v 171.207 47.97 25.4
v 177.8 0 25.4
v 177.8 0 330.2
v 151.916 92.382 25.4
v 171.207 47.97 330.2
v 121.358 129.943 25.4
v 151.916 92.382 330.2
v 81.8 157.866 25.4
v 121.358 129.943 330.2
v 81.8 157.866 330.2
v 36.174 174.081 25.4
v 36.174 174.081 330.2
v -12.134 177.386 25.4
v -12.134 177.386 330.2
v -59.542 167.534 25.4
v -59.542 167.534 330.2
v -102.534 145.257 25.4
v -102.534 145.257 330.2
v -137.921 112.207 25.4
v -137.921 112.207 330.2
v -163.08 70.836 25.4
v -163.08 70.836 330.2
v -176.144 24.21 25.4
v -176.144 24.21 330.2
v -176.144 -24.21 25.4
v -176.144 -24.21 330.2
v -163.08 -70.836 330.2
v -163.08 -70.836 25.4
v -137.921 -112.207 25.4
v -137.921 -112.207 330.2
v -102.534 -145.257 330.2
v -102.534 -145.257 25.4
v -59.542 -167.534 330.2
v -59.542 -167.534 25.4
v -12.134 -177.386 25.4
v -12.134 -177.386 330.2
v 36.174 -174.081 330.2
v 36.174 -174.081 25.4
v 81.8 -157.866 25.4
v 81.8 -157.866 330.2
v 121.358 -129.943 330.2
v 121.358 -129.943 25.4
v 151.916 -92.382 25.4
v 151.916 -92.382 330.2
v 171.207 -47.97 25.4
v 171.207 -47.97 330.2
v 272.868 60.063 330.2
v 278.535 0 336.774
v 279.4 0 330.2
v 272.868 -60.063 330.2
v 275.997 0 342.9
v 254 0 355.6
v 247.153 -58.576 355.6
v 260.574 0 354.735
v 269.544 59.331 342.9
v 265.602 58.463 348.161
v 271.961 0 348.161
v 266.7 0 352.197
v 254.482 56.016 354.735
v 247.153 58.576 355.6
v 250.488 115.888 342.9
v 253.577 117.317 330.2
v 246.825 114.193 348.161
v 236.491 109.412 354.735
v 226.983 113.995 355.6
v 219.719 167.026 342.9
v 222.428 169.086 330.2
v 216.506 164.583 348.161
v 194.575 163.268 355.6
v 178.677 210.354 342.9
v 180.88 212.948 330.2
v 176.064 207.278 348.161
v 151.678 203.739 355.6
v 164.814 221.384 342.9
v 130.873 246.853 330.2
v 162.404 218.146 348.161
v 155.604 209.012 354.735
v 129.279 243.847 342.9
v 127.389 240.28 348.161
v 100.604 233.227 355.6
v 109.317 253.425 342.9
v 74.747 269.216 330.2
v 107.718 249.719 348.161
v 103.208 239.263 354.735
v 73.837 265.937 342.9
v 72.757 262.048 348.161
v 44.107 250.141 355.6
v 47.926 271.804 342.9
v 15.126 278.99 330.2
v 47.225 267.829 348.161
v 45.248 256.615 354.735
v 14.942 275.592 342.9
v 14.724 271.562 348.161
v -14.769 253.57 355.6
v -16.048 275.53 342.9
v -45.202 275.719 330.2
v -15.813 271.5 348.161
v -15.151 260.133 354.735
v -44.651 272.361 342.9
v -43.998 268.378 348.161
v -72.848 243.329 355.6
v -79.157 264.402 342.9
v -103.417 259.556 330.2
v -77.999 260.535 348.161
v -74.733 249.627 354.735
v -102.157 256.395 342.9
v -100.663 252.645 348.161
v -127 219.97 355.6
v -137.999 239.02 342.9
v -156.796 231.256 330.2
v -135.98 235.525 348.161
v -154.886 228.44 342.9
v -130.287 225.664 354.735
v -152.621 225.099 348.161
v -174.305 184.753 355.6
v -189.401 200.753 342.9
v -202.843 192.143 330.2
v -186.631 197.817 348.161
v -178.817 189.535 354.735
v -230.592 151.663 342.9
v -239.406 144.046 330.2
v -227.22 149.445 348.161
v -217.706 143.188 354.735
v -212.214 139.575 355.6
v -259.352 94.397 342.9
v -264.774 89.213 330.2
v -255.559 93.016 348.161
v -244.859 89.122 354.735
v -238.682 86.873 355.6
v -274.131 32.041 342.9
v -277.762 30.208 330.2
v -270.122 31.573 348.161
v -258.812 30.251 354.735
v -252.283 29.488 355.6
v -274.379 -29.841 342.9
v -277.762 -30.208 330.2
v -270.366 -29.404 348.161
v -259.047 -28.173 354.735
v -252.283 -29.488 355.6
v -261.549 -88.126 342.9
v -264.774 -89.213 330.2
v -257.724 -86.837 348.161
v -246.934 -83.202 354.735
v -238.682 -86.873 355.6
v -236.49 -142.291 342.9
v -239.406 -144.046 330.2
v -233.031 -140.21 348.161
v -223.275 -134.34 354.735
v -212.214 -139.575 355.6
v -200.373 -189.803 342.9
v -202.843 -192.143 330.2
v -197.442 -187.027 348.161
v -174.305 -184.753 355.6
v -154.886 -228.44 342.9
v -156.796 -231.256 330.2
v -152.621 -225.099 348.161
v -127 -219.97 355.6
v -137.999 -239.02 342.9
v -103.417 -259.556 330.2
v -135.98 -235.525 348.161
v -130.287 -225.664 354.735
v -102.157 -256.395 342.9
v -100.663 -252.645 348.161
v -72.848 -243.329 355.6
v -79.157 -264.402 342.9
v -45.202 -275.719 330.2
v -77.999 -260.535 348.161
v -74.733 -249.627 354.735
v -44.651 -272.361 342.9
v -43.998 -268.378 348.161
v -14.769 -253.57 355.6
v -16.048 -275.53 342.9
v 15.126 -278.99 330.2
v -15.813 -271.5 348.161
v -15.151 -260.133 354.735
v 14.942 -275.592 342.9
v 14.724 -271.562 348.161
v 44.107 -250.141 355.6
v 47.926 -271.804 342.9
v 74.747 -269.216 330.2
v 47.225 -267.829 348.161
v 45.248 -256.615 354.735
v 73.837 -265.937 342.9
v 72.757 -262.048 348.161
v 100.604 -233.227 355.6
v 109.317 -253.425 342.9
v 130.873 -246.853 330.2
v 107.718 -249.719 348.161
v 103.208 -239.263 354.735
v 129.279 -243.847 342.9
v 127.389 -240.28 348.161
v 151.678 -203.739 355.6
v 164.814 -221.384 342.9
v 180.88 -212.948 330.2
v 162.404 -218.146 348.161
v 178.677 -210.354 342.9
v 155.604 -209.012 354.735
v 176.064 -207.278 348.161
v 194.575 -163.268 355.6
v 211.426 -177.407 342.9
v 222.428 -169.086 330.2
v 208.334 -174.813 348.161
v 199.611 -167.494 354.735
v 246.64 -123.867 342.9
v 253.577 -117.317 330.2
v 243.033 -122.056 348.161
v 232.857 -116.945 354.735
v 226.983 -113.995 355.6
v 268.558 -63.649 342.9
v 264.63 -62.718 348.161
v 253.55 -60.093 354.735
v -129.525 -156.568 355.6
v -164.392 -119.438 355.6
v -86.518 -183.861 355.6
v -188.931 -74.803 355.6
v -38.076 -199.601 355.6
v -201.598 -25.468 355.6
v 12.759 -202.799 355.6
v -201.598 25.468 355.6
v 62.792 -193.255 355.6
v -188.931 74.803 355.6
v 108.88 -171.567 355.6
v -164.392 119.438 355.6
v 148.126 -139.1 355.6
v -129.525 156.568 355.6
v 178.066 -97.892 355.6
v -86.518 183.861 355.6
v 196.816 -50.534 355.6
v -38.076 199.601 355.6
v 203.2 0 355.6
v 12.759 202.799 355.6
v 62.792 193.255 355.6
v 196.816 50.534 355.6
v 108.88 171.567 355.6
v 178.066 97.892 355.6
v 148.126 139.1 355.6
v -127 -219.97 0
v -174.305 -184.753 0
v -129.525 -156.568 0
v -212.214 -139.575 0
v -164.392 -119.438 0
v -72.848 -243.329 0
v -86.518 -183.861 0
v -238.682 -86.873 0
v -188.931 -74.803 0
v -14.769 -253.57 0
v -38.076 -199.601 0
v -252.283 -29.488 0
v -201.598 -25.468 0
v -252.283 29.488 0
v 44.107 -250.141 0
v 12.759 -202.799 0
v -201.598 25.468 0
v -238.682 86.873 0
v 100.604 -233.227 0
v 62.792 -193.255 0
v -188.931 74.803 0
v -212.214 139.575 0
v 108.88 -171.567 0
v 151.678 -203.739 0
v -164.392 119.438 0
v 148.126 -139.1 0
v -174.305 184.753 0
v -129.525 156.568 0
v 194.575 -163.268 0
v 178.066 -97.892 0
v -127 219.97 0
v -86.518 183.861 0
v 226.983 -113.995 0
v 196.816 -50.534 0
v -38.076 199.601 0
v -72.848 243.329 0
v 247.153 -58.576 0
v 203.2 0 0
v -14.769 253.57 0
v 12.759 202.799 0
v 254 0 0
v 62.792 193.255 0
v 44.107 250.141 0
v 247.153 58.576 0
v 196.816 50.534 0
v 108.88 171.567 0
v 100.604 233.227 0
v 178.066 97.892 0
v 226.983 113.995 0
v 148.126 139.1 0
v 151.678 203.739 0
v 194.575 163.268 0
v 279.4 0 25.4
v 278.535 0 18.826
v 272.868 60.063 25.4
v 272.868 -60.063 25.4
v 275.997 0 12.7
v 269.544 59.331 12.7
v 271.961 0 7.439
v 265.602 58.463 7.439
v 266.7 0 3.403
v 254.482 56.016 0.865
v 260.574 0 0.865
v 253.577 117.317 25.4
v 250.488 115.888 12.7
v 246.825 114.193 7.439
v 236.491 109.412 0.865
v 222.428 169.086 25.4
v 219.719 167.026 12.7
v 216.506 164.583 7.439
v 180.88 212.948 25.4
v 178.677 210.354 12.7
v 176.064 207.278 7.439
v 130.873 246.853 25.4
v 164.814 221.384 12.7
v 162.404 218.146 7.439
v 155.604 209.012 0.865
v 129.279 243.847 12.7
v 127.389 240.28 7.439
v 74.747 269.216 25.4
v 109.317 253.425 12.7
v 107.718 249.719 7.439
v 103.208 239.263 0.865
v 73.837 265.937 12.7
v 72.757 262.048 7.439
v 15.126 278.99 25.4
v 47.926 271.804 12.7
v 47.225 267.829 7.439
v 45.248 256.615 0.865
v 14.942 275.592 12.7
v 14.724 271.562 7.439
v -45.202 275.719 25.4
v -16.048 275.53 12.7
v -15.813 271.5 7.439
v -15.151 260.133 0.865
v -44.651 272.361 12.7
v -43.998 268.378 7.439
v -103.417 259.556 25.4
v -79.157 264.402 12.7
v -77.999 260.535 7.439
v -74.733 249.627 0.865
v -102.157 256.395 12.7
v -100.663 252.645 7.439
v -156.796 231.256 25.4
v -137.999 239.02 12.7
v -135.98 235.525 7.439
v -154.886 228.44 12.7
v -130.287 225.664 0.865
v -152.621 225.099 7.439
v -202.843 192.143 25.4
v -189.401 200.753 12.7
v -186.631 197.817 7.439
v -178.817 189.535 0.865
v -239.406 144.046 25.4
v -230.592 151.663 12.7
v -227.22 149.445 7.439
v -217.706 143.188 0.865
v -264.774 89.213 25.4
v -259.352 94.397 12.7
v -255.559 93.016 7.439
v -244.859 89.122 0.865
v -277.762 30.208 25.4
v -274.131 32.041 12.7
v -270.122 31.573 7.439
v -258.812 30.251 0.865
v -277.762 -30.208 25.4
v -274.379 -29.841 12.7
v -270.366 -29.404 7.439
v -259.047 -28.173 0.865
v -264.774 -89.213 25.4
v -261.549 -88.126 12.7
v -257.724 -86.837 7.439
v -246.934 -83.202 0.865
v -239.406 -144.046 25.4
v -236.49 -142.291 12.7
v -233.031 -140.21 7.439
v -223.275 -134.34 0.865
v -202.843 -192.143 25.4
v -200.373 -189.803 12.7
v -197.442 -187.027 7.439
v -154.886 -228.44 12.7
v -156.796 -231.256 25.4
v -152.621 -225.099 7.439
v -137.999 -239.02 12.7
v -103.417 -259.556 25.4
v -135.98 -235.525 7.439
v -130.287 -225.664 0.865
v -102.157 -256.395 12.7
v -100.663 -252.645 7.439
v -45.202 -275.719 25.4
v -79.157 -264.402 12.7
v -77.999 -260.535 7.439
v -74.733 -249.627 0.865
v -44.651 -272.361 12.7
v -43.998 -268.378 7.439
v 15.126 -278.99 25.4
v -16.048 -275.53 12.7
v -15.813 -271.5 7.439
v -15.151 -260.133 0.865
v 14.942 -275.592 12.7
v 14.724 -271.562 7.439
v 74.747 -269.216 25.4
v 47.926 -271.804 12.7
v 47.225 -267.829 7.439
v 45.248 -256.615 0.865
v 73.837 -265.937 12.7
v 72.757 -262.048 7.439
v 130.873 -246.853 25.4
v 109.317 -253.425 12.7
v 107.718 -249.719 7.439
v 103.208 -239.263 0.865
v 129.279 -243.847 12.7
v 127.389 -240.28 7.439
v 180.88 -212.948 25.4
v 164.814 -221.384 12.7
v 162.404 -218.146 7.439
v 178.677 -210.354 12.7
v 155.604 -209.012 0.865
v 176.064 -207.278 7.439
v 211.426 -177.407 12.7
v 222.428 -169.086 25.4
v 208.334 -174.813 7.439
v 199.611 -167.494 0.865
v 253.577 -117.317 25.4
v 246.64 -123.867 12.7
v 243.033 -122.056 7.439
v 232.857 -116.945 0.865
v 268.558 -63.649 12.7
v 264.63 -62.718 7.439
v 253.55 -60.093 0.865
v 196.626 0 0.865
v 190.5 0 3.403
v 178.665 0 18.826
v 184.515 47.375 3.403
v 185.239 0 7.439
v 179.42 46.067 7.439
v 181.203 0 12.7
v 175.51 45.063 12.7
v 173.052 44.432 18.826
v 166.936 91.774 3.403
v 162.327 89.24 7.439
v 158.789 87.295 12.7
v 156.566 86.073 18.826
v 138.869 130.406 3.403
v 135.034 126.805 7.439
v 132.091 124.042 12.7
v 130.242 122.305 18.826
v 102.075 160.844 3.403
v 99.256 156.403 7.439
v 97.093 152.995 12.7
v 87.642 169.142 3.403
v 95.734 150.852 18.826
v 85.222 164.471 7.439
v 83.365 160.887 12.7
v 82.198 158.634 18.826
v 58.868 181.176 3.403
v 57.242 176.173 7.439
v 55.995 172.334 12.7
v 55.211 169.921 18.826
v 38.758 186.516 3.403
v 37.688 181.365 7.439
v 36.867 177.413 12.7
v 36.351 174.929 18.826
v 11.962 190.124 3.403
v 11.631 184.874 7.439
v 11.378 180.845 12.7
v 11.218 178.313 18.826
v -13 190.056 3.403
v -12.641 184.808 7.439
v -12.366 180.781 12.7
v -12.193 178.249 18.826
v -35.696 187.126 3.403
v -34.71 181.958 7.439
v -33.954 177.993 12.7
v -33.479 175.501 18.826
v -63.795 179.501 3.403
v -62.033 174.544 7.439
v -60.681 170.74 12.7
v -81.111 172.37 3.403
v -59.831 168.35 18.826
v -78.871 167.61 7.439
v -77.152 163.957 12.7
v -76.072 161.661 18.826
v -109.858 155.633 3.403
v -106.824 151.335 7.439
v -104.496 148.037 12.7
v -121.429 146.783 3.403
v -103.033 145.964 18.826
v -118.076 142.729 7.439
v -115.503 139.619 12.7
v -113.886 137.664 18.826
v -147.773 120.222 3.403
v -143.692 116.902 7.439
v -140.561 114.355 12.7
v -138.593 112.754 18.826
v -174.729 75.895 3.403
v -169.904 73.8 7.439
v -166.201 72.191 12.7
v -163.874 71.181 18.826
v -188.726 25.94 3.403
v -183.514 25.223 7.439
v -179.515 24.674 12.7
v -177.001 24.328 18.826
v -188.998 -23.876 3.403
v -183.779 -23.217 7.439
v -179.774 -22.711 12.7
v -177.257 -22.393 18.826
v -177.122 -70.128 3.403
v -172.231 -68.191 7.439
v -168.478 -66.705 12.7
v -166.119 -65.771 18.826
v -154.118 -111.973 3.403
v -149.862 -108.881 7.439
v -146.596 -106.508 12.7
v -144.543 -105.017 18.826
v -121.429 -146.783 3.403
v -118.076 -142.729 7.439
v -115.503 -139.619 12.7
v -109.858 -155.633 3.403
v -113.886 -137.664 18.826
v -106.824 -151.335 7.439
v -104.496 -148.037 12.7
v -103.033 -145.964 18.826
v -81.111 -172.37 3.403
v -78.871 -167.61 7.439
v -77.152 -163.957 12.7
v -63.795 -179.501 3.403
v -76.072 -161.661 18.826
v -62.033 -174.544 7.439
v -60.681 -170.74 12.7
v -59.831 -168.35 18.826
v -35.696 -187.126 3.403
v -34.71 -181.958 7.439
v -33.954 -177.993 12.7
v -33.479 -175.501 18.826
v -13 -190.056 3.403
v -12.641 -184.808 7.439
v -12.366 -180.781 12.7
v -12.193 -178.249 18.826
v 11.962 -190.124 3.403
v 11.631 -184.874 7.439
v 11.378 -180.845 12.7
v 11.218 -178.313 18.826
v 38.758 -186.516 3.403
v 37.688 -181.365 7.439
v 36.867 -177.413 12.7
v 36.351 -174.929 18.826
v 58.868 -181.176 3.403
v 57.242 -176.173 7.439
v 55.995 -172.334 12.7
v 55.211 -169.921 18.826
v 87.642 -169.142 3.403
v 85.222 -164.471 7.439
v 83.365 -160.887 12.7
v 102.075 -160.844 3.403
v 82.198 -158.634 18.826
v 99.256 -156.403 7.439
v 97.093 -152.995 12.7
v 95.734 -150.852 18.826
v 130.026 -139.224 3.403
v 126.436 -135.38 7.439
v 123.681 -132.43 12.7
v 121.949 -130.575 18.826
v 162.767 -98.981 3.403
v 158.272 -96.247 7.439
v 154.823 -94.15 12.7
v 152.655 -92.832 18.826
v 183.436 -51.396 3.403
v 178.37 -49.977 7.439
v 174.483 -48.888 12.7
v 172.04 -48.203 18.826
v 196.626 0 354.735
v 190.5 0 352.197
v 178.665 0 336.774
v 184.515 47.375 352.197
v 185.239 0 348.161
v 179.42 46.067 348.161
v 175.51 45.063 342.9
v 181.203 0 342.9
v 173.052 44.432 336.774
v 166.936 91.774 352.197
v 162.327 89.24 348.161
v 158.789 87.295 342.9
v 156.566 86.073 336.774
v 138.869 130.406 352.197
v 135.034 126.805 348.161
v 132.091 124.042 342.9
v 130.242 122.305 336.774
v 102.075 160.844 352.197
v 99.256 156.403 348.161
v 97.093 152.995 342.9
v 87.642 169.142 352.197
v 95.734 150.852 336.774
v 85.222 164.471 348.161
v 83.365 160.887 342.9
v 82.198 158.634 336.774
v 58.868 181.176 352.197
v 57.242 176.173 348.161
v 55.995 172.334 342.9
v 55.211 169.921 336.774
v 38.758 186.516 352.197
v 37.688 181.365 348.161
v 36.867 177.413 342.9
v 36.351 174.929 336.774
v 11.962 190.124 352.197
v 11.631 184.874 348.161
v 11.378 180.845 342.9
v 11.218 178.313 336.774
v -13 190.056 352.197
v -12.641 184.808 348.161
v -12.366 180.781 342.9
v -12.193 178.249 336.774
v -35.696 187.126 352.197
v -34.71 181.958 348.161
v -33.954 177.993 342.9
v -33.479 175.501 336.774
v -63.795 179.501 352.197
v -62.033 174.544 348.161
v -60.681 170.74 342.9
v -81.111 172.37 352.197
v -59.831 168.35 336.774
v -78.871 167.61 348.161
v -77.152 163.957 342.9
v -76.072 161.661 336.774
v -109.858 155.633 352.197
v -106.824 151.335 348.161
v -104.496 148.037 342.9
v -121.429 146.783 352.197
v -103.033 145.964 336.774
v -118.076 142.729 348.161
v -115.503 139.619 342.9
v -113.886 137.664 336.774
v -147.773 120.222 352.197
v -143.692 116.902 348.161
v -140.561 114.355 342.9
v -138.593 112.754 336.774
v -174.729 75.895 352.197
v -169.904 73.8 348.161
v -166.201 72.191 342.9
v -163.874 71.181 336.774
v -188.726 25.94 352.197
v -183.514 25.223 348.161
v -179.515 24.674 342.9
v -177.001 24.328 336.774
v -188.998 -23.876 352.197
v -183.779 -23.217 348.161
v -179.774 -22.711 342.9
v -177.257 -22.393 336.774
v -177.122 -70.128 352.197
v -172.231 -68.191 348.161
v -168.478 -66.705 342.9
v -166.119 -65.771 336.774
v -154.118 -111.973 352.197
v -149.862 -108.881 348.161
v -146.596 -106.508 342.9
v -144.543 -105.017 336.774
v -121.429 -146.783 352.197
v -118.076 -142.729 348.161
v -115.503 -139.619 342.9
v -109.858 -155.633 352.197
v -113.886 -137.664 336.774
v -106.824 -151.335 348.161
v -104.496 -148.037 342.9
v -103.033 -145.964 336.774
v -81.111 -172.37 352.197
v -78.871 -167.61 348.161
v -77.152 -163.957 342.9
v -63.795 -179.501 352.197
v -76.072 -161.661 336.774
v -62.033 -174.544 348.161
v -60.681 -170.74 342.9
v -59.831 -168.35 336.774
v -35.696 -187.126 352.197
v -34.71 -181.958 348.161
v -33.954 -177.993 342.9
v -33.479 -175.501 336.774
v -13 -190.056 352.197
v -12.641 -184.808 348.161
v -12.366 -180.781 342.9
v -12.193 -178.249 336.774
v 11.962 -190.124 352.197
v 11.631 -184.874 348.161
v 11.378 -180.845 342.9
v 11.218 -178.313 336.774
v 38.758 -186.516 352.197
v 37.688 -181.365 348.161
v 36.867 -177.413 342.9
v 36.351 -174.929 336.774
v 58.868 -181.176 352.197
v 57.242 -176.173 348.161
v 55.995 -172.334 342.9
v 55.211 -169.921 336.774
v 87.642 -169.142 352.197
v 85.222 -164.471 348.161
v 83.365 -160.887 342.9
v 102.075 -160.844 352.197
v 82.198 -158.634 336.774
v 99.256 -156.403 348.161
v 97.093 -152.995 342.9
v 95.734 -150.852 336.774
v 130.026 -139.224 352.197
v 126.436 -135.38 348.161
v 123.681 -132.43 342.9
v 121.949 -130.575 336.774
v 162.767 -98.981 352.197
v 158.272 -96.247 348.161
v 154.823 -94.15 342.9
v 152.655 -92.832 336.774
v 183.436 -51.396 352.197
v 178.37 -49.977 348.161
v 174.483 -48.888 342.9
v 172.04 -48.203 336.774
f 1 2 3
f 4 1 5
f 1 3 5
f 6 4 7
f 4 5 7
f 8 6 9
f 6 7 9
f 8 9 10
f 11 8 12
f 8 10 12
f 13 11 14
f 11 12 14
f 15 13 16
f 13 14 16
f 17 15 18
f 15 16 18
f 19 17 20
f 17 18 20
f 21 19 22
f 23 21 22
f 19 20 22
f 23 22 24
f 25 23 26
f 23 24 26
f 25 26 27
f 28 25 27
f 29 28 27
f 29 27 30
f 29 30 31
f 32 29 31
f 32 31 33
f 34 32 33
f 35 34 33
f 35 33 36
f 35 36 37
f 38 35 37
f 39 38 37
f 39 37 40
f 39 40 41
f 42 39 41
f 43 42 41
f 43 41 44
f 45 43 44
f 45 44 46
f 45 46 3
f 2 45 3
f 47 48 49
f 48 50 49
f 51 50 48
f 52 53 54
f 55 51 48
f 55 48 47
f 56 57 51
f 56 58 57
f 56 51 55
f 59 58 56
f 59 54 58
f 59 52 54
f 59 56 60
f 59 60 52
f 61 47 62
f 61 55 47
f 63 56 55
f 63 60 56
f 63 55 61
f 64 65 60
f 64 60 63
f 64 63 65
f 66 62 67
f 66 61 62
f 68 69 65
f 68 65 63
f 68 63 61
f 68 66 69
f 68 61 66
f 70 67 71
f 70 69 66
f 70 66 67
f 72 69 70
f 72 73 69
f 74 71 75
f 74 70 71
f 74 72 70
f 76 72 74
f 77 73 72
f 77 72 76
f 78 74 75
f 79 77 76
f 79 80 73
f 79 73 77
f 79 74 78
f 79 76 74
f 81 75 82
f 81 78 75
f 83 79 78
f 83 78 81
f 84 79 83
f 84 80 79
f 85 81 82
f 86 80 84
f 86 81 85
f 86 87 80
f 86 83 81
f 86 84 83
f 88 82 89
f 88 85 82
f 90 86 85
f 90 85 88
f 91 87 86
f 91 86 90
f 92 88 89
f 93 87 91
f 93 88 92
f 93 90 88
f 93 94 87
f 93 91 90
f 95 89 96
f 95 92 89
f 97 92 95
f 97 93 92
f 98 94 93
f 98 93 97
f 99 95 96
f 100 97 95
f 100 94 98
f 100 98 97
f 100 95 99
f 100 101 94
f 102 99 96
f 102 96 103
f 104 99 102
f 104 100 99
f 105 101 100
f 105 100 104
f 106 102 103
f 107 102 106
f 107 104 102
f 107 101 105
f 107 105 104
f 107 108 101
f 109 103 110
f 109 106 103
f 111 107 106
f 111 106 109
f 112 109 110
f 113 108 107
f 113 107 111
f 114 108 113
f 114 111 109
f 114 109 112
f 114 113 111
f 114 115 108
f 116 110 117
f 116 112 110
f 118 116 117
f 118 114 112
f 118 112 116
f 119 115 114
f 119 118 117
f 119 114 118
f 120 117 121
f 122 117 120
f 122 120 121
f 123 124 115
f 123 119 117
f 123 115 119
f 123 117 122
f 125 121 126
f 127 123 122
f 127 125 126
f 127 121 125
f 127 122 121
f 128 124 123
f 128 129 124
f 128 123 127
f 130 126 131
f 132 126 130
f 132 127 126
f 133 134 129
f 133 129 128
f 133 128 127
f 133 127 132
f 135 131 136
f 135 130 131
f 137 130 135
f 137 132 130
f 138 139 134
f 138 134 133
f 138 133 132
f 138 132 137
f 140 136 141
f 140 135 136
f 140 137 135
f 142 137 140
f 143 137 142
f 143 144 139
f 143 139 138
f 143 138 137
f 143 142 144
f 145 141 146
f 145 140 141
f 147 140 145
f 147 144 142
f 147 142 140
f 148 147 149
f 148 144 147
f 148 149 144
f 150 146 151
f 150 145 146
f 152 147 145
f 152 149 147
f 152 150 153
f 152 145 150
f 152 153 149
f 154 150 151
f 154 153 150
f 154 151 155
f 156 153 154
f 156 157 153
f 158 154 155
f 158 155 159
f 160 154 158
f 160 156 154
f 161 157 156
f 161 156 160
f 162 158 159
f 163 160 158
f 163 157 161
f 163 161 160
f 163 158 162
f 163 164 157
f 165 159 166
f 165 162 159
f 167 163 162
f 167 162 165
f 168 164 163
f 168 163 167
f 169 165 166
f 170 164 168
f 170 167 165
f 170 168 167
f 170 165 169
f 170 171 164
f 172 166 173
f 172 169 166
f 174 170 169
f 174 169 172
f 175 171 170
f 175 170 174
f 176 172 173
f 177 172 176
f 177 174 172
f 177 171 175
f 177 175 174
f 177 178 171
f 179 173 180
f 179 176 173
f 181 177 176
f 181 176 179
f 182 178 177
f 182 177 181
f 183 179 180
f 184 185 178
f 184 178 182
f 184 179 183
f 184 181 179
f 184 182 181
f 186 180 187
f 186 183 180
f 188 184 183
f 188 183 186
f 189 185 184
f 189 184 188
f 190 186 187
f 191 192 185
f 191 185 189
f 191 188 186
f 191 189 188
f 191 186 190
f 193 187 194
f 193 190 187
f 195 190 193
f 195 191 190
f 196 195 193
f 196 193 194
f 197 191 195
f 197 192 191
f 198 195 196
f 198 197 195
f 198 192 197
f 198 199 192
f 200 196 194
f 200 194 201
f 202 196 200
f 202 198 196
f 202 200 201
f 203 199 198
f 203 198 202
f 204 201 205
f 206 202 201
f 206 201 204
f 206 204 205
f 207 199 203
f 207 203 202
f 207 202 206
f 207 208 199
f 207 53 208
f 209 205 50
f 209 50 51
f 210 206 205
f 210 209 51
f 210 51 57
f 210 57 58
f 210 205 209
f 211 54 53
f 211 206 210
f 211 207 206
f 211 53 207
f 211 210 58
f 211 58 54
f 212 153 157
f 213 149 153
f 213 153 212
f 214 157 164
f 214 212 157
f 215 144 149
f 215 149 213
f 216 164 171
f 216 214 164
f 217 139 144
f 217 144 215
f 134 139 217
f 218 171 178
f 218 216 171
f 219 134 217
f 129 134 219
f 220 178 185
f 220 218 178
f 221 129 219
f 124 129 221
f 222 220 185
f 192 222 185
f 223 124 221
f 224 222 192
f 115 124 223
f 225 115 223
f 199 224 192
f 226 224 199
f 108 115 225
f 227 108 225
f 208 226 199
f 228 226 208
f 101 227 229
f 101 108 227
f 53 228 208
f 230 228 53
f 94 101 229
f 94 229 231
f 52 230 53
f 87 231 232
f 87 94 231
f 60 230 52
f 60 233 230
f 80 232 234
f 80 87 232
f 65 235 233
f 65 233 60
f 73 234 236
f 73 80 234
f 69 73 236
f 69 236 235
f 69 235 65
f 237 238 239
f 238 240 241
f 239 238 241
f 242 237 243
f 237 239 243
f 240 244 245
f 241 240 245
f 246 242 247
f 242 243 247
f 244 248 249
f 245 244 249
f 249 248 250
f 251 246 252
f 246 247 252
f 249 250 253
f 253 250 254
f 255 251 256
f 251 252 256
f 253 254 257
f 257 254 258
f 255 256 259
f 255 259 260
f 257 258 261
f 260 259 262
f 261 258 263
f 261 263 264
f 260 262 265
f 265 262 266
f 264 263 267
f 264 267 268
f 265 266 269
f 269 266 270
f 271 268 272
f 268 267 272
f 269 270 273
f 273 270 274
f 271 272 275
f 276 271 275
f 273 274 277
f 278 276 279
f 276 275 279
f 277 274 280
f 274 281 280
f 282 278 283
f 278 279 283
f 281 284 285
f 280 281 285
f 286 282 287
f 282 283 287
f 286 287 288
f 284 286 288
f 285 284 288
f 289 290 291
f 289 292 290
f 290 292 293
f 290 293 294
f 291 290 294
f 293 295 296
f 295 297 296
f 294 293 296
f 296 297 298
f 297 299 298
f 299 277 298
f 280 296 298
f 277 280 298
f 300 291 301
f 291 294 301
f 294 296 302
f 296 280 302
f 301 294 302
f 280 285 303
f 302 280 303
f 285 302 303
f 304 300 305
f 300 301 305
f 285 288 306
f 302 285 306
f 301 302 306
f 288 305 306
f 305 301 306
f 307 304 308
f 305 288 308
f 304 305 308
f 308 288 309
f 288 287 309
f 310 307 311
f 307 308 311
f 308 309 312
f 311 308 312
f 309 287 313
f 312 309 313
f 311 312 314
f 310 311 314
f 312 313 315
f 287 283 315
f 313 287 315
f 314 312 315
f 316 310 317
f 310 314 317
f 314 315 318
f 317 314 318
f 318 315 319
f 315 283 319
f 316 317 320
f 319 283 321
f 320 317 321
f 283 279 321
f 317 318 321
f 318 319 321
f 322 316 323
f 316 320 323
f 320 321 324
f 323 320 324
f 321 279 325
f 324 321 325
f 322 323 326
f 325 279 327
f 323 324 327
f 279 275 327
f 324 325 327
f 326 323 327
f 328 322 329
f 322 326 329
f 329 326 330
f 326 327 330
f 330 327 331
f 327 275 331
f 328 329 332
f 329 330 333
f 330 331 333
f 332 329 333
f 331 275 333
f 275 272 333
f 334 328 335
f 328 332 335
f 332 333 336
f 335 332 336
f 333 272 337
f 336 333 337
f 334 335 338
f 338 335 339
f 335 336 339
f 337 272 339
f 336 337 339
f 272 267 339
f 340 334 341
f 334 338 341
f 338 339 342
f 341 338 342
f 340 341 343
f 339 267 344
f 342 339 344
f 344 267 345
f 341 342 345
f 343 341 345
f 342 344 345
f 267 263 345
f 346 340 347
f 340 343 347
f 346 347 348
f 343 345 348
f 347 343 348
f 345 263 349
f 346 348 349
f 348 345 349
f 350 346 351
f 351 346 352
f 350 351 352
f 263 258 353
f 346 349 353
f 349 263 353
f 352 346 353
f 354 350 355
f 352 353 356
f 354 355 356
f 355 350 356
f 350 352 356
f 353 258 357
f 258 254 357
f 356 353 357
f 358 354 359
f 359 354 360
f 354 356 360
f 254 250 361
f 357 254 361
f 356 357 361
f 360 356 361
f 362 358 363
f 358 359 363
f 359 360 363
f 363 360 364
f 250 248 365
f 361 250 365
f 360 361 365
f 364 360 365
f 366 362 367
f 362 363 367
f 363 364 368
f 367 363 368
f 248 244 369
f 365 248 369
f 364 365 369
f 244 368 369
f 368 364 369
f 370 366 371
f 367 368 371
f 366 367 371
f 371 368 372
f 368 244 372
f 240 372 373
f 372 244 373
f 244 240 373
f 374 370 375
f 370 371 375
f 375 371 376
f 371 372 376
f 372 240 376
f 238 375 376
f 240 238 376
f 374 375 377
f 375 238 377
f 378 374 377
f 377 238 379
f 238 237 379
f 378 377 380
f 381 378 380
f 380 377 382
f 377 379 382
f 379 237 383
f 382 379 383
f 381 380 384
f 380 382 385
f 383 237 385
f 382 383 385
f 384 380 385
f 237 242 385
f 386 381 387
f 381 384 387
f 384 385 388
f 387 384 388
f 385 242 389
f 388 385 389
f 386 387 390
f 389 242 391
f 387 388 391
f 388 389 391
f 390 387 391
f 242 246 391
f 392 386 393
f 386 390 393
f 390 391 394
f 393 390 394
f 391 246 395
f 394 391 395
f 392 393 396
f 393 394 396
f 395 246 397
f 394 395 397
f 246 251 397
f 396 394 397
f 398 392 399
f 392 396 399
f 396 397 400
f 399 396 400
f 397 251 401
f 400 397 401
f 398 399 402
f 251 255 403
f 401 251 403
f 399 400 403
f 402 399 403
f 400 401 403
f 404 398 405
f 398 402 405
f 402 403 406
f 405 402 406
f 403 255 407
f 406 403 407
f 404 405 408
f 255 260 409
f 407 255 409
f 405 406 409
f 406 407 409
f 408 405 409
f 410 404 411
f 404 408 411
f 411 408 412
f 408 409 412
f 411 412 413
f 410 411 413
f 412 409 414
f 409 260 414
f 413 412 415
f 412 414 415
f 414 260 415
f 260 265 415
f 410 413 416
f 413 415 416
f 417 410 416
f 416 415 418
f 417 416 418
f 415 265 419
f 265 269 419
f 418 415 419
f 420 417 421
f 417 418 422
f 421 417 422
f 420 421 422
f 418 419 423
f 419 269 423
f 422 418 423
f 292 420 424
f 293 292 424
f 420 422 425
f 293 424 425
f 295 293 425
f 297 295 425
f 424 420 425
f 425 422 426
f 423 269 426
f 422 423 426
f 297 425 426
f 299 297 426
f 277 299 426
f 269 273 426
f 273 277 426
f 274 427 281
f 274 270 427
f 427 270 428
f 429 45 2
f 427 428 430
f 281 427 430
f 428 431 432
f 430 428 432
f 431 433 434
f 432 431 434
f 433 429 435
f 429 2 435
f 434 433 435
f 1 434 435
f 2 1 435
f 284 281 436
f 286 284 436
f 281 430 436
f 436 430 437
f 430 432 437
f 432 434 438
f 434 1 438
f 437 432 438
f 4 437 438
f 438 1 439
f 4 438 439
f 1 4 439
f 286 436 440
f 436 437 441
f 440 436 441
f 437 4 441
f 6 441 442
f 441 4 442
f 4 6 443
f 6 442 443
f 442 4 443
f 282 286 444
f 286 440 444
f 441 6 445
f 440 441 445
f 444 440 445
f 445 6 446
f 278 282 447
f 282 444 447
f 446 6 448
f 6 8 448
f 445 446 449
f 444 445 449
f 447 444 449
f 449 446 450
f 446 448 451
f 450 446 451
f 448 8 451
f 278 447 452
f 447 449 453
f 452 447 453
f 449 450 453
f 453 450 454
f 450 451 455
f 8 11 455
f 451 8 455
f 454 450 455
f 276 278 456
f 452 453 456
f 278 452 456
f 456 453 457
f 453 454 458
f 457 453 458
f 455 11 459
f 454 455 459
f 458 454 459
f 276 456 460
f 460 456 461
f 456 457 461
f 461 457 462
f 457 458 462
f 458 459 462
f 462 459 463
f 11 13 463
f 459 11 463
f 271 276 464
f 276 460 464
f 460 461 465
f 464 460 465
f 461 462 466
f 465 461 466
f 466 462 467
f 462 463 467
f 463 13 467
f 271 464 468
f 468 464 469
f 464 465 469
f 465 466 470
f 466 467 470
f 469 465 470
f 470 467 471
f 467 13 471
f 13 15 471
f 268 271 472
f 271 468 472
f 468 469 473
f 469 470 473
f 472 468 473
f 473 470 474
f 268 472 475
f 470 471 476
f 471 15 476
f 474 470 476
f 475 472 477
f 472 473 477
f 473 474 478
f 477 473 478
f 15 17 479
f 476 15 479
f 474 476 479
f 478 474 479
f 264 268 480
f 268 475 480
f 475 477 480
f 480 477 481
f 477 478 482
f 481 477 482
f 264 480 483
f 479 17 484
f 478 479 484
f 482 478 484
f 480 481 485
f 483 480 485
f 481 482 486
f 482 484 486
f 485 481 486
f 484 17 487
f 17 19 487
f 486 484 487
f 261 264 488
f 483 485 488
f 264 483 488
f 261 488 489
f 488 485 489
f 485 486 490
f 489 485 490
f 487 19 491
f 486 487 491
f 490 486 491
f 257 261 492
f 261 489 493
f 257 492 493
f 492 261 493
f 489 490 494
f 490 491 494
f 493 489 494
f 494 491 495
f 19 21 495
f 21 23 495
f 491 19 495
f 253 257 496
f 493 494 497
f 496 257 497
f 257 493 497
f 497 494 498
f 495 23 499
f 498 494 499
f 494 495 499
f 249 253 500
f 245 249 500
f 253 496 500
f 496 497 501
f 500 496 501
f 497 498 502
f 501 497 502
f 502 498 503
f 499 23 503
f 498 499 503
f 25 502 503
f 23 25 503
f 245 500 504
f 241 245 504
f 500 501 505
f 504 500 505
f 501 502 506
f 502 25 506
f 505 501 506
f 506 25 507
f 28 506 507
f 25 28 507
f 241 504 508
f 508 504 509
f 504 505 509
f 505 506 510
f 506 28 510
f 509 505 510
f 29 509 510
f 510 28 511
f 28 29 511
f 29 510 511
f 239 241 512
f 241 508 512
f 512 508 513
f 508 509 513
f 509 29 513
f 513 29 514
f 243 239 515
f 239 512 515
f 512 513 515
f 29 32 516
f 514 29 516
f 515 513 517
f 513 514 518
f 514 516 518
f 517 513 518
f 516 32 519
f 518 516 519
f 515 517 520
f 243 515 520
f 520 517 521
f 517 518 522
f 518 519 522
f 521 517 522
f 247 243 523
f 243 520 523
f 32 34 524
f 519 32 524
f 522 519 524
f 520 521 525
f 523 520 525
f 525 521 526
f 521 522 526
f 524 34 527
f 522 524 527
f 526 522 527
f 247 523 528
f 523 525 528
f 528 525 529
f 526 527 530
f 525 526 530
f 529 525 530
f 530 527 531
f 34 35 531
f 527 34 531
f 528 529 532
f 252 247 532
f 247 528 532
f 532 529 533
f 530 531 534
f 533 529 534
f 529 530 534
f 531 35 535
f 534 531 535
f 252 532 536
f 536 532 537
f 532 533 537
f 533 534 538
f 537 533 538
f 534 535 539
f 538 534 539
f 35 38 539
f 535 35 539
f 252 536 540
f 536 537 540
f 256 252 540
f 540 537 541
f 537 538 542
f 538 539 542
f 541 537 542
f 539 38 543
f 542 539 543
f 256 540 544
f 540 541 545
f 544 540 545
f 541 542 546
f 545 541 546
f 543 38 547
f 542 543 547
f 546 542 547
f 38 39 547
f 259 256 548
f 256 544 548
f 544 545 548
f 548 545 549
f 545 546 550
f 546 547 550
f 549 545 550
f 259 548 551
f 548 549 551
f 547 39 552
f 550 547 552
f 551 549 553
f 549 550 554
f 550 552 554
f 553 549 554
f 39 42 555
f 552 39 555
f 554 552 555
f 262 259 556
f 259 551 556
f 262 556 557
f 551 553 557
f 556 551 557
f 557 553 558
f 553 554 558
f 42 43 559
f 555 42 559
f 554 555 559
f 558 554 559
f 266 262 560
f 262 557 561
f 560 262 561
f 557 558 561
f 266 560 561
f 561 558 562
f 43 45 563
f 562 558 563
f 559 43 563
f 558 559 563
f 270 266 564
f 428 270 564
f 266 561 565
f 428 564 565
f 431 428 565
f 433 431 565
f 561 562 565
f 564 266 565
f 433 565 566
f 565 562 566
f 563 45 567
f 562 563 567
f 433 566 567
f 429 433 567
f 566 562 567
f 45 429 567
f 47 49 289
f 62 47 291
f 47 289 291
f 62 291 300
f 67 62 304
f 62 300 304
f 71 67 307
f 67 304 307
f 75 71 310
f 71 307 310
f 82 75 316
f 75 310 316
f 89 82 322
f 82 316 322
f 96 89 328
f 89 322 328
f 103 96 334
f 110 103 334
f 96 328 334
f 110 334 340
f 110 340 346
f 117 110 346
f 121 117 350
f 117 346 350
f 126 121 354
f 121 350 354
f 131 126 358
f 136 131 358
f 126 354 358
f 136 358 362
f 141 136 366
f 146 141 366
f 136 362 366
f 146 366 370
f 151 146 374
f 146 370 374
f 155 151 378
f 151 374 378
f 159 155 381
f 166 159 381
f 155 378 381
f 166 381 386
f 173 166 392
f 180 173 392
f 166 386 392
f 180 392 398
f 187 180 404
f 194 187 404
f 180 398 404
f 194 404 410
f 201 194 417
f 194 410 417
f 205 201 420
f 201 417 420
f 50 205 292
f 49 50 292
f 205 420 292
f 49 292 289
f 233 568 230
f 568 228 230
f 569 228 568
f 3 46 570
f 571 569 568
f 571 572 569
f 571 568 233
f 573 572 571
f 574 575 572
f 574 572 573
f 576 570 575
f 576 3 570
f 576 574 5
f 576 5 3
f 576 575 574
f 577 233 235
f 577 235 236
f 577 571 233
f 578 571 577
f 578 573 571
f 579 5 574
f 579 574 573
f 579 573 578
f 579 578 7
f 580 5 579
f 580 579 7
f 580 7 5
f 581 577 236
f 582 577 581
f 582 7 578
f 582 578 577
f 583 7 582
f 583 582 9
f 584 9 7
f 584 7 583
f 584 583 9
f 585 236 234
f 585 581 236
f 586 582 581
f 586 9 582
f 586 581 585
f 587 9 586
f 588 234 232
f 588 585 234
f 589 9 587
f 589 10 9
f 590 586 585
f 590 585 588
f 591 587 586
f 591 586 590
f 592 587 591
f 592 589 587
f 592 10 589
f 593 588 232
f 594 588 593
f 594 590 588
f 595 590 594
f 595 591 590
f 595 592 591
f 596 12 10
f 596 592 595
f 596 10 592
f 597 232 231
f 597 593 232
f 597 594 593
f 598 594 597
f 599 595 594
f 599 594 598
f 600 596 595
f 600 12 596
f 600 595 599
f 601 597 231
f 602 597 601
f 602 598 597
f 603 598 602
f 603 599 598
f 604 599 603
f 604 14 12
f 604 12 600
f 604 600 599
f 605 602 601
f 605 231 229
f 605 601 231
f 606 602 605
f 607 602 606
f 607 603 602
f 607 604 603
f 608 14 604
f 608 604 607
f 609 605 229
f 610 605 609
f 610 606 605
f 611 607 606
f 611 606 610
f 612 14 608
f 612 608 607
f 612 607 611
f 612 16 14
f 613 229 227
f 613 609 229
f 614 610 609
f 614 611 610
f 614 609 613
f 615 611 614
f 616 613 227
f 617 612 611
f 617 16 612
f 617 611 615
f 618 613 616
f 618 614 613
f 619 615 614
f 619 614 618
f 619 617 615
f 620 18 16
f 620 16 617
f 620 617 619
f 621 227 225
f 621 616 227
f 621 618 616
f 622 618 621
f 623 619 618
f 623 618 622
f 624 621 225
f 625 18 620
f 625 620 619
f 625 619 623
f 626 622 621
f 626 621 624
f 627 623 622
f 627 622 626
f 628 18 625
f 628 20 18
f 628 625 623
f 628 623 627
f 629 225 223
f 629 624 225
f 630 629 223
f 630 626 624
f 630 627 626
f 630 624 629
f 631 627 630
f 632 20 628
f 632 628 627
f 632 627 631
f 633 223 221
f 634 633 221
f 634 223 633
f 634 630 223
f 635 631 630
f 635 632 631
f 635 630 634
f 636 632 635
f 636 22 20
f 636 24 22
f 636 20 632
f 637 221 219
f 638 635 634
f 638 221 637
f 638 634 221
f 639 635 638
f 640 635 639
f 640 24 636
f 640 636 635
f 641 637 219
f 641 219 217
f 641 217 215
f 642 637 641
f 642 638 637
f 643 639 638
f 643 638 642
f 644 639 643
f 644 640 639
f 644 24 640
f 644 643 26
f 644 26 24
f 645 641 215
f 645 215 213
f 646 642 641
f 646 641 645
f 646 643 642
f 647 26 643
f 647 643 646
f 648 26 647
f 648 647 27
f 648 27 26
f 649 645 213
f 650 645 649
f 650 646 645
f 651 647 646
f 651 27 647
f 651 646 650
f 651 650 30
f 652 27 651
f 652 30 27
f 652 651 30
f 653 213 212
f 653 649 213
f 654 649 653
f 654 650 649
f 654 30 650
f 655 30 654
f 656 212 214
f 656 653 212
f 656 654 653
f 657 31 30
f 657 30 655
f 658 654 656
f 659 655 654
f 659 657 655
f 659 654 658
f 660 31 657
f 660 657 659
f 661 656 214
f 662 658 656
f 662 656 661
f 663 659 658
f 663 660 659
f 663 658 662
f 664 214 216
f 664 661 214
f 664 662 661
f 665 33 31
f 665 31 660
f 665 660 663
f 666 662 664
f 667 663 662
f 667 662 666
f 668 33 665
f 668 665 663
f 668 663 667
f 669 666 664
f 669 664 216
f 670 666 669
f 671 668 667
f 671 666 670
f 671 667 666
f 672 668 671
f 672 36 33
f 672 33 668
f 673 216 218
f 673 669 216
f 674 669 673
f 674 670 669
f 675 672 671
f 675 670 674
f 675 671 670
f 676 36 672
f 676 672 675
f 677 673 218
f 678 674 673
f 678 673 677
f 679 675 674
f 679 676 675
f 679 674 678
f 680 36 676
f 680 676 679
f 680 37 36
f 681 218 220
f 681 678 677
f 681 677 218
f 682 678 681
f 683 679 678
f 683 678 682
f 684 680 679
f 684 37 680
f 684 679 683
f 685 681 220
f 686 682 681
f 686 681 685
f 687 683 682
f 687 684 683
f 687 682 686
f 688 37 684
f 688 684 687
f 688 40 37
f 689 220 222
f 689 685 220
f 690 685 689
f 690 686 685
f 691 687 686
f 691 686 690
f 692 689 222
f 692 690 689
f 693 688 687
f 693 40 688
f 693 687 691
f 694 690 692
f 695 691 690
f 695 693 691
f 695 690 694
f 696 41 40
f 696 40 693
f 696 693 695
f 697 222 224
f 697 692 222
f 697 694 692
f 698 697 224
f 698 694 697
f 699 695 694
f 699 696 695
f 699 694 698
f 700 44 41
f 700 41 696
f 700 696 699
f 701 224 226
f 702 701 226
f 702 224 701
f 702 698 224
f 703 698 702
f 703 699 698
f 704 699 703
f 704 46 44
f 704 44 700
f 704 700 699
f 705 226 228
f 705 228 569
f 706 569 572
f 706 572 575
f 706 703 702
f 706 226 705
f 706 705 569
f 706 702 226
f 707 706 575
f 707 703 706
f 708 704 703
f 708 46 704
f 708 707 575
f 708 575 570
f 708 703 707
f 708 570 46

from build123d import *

# Parameters (mm, degrees)
SKETCH2_R           = 279.4
BOSS_EXTRUDE1_DEPTH = 355.6
SKETCH3_R           = 177.8
CUT_EXTRUDE1_DEPTH  = 532.582618226
FILLET3_R           = 25.4
FILLET4_R           = 25.4


with BuildPart() as part:
    # Sketch2 → Boss-Extrude1 (new body)
    with BuildSketch(Plane.XY):
        Circle(SKETCH2_R)
    extrude(amount=BOSS_EXTRUDE1_DEPTH)

    # Sketch3 → Cut-Extrude1 (cut, through all)
    with BuildSketch(Plane.XY.offset(355.6)):
        Circle(SKETCH3_R)
    extrude(amount=-CUT_EXTRUDE1_DEPTH, mode=Mode.SUBTRACT)

    # Fillet3
    fillet3_edges = [part.edges().sort_by_distance(p)[0] for p in [
        (-279.4, 0, 0),
        (-279.4, 0, 355.6),
    ]]
    fillet(fillet3_edges, radius=FILLET3_R)

    # Fillet4
    fillet4_edges = [part.edges().sort_by_distance(p)[0] for p in [
        (-177.8, 0, 0),
        (-177.8, 0, 355.6),
    ]]
    fillet(fillet4_edges, radius=FILLET4_R)


solid = part.part
